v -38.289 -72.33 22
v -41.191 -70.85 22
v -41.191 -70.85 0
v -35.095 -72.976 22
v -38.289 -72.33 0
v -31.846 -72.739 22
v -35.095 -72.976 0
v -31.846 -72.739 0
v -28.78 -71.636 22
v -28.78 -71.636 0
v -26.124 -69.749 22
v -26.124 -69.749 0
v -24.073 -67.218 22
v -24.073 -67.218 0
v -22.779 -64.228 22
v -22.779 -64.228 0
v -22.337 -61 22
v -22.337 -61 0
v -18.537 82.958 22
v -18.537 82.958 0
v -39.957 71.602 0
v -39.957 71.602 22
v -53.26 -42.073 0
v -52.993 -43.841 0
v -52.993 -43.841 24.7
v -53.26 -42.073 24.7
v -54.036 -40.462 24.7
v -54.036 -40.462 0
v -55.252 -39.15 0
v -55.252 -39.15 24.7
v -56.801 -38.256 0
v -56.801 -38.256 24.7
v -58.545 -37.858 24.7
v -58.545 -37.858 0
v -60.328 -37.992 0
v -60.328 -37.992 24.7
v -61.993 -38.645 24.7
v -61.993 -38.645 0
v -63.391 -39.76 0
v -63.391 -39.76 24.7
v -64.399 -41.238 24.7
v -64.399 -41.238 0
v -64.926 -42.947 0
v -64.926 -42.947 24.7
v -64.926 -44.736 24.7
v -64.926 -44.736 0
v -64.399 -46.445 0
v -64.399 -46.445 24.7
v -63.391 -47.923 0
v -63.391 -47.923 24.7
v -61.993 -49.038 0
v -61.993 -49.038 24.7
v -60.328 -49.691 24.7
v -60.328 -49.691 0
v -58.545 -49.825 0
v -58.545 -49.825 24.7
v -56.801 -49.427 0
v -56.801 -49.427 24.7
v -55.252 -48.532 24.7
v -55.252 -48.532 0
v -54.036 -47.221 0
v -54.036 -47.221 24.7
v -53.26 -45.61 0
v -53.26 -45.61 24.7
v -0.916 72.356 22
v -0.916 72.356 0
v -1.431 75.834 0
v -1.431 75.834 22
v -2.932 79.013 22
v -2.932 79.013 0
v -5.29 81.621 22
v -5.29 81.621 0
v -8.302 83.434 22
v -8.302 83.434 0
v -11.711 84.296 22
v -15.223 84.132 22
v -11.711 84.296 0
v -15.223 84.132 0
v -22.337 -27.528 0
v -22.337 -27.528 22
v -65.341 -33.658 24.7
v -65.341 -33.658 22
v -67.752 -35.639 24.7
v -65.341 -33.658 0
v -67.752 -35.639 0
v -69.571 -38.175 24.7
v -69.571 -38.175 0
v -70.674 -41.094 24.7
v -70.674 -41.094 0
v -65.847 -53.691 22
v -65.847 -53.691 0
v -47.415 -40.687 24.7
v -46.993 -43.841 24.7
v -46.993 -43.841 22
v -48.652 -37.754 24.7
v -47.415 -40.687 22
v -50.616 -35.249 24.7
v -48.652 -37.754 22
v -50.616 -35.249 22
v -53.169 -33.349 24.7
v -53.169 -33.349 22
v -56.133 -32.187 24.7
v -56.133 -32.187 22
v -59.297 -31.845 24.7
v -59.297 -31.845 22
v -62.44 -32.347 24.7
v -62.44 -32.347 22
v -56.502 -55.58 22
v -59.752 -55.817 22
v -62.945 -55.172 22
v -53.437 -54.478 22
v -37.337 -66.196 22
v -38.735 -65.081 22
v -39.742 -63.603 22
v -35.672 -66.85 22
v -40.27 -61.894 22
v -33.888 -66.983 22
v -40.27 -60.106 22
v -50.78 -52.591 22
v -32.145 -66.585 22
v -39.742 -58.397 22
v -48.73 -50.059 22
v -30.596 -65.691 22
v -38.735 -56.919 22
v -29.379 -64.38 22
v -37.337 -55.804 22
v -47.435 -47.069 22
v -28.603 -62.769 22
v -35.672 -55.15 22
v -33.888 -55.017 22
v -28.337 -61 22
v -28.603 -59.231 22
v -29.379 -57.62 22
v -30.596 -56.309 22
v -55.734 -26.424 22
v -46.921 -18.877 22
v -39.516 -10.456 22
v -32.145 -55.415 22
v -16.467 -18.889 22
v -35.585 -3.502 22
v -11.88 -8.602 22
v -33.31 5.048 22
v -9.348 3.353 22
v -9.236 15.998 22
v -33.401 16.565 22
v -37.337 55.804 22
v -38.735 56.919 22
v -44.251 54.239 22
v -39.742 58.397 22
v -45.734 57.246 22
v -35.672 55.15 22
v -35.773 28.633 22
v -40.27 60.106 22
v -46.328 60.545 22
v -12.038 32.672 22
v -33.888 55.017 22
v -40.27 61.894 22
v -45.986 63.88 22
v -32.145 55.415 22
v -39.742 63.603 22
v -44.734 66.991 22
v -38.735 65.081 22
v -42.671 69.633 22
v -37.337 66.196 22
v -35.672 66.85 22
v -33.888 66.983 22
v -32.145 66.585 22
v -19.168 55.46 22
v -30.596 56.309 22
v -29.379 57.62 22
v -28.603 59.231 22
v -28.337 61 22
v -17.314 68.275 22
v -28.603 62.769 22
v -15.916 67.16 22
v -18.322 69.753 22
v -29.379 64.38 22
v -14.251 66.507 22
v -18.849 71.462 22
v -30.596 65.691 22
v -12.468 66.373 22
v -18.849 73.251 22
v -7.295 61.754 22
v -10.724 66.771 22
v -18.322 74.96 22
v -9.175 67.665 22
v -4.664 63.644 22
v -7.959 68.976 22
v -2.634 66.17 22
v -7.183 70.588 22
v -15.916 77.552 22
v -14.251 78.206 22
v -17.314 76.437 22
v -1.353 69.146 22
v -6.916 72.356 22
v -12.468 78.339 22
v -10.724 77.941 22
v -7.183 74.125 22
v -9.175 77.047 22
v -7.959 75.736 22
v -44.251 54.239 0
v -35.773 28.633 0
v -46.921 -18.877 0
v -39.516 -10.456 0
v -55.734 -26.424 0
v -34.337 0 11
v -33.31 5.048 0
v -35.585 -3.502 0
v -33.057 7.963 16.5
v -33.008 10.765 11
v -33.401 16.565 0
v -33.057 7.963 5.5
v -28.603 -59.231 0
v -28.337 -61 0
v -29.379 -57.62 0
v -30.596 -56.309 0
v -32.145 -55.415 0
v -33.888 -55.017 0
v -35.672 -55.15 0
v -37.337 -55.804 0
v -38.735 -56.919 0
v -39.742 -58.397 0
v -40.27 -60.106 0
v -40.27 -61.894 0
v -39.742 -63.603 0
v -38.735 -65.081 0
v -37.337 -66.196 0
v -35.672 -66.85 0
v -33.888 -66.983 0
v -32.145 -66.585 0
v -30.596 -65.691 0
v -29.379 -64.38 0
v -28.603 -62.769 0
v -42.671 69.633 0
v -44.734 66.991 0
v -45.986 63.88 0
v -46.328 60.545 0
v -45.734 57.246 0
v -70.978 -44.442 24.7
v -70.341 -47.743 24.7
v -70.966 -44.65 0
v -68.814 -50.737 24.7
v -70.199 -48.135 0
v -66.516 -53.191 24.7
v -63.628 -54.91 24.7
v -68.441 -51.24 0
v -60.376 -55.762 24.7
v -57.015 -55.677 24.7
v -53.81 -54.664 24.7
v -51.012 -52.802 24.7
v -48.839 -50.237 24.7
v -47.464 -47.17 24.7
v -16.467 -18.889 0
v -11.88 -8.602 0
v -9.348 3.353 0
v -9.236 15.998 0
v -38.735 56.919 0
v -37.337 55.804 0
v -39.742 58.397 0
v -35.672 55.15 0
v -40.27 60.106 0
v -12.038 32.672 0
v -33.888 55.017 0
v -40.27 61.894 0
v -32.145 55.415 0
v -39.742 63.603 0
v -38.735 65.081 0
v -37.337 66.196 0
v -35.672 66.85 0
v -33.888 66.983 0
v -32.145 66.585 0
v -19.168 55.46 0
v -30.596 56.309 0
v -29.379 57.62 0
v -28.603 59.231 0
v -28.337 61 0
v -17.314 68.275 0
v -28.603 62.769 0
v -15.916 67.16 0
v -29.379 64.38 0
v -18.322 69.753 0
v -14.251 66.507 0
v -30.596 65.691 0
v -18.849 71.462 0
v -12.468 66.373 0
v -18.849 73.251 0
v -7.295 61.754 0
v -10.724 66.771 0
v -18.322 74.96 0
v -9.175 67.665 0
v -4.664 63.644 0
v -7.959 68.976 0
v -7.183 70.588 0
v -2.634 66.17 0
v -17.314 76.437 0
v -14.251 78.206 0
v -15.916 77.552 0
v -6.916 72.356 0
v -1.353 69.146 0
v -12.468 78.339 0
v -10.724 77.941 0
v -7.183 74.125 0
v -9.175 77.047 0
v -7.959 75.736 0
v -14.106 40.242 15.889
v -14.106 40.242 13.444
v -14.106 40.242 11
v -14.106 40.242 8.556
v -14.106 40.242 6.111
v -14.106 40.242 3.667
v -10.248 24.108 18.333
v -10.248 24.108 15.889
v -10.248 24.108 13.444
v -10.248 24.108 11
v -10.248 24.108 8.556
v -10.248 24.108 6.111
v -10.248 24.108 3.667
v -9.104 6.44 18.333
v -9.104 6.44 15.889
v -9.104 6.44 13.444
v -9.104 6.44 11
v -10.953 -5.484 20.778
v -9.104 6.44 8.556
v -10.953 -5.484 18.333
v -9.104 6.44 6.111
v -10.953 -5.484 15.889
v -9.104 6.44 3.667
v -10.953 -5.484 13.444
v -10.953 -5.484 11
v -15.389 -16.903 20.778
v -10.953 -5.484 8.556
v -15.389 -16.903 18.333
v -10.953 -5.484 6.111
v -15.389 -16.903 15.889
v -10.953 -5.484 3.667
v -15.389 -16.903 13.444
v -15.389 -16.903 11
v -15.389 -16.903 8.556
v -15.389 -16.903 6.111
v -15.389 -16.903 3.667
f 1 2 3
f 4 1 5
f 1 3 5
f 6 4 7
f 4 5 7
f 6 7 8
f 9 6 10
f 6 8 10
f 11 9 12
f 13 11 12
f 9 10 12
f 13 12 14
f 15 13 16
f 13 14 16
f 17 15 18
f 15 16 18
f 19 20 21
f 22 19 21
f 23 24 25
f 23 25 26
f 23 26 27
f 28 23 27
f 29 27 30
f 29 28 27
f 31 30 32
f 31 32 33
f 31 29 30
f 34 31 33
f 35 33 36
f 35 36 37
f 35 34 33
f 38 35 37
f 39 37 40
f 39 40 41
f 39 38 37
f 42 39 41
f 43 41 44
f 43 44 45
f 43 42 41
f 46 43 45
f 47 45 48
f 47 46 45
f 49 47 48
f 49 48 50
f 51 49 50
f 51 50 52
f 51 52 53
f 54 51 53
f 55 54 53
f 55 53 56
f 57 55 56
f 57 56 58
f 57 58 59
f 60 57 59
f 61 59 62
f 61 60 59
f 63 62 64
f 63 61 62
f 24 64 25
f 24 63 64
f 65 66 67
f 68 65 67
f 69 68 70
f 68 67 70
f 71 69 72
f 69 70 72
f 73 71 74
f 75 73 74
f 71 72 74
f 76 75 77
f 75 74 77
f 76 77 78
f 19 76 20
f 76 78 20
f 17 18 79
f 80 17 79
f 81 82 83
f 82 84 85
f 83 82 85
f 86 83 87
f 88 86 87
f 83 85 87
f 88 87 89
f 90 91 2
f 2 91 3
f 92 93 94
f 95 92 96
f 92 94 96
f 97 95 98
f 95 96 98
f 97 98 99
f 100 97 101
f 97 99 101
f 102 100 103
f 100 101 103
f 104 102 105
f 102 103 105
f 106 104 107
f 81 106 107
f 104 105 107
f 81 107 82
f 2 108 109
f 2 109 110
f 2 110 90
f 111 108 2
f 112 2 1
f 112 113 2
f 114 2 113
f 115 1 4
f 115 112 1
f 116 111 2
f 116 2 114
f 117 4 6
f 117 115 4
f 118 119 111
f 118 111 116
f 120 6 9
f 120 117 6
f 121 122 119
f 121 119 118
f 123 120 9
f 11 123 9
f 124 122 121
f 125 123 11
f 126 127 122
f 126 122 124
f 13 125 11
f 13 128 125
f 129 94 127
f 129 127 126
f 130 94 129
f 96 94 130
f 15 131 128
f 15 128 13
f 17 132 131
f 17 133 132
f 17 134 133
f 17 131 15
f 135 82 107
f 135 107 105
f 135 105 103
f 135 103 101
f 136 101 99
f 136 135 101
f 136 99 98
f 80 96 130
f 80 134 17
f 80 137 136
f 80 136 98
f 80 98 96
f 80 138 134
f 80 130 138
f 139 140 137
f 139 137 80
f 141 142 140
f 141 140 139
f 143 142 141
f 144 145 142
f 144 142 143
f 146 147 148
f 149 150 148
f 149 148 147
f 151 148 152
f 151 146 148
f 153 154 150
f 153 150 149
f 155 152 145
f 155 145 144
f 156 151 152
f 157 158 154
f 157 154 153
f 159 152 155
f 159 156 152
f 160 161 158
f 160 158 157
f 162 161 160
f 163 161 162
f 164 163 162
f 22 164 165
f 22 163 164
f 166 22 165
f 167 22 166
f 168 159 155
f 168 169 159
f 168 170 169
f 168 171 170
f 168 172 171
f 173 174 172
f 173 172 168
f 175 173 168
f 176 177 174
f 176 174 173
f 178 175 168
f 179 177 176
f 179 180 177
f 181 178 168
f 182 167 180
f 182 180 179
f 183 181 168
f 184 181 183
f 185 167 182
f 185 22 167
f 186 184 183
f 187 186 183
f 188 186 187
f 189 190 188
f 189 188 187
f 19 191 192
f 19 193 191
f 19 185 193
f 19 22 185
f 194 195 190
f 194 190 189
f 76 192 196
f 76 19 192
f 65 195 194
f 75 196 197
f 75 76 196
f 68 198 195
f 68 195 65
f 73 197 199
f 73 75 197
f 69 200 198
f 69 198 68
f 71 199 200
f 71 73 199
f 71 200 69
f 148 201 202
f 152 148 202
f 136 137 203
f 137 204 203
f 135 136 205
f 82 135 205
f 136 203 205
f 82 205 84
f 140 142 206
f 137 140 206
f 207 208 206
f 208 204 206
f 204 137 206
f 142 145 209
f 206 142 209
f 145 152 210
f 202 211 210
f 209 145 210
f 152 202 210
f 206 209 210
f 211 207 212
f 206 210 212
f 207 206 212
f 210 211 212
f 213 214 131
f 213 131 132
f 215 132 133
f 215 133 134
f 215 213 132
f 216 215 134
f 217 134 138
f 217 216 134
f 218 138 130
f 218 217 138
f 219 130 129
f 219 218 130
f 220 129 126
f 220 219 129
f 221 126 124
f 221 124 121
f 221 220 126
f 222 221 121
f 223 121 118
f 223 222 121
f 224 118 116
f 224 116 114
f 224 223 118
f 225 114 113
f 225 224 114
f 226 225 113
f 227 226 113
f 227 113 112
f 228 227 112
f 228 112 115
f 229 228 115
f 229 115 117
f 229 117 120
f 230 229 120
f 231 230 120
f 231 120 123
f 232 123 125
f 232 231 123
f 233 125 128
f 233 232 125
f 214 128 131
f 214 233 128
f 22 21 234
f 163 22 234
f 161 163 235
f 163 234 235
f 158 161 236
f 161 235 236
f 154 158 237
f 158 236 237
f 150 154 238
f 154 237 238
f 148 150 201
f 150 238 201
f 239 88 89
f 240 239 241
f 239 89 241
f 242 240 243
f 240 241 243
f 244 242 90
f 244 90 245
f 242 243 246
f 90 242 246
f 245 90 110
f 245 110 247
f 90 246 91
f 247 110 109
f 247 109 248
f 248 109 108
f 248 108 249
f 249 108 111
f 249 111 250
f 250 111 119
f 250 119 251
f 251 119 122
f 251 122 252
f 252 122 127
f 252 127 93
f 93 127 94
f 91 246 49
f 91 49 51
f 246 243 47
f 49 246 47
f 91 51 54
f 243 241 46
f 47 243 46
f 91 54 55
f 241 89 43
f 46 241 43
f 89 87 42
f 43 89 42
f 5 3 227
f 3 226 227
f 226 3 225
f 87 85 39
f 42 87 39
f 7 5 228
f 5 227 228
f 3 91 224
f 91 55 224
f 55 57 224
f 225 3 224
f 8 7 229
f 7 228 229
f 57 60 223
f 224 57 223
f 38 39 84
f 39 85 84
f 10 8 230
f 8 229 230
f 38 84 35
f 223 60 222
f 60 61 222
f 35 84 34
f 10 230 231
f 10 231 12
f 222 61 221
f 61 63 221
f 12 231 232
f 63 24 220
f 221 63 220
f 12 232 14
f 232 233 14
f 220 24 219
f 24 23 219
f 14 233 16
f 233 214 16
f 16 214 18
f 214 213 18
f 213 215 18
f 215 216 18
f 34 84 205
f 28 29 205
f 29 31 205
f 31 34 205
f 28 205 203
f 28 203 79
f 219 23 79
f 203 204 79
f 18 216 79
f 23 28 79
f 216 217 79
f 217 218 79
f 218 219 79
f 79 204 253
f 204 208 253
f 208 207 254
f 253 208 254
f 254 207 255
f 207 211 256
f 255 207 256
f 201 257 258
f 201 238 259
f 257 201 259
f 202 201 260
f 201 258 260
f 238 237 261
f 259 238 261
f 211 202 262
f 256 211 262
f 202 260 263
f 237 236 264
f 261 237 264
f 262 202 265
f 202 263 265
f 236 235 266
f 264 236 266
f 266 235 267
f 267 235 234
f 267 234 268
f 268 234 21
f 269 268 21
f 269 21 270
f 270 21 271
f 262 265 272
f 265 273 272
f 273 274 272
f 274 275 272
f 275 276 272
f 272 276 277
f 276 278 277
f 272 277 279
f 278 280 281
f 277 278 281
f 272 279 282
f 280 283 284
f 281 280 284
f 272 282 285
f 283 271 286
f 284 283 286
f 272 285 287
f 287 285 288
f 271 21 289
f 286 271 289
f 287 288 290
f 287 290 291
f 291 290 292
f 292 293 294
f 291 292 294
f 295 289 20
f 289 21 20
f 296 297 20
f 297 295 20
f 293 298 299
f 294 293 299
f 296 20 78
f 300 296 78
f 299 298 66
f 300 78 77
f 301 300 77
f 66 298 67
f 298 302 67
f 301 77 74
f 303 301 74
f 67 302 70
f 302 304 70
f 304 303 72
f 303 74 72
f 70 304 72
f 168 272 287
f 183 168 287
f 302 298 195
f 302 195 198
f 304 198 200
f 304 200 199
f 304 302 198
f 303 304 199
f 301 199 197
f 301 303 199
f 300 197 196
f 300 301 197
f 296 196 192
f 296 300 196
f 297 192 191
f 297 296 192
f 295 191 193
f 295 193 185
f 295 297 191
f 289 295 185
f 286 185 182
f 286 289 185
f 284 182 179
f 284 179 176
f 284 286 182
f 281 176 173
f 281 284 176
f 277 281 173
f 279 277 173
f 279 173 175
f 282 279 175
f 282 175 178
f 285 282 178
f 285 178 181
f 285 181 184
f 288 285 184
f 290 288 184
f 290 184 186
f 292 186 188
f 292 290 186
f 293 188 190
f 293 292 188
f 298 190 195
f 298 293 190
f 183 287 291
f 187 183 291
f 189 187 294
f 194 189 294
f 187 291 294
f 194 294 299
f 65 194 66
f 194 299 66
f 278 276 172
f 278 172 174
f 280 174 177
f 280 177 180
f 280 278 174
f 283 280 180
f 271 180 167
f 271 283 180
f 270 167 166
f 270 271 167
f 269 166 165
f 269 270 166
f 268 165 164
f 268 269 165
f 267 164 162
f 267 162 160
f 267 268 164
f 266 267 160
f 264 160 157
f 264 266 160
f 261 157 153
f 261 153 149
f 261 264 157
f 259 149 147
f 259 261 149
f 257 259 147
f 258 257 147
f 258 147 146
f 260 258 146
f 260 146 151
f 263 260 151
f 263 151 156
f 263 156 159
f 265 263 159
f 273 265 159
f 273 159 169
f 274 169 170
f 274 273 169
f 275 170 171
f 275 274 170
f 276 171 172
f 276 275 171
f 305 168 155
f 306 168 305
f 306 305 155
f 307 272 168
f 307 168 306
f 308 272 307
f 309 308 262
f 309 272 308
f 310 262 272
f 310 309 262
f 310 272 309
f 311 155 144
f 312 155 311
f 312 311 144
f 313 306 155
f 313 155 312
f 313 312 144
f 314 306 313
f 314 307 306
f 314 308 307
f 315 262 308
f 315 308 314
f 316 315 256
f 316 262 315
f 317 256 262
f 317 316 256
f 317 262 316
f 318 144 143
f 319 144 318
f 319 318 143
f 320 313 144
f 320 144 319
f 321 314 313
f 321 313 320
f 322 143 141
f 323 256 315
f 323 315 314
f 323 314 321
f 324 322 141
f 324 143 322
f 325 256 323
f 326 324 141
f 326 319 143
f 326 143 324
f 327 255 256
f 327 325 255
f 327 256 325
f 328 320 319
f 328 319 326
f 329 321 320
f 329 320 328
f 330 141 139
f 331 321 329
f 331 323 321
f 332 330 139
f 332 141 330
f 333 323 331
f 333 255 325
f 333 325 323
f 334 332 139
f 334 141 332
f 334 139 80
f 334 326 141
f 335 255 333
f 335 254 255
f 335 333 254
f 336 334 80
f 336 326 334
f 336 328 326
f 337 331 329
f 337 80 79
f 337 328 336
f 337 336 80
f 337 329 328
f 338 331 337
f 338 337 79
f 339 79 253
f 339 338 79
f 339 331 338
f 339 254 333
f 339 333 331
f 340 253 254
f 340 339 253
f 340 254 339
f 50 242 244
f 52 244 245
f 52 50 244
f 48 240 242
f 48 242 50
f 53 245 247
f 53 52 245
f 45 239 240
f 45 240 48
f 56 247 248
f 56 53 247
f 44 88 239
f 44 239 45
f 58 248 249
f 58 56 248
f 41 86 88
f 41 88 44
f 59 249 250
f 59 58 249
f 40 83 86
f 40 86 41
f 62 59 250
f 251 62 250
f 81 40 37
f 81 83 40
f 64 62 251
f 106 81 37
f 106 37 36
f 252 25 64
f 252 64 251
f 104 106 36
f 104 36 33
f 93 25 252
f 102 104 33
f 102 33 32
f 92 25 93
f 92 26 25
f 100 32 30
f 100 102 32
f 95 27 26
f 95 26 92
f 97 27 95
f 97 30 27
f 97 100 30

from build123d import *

# Parameters (mm, degrees)
F0_R     = 6
F1_DEPTH = 22
F2_DEPTH = 24.7


# Not quite as in the source:
# - the dataset's text gives a spline's control points without its knots; the knots are read off the source's solid
# - a feature names something its author has since deleted; it is built from what else it names


with BuildPart() as f1:
    # F0 (on Top) → F1 (new body)
    with BuildSketch(Plane.XY):
        with BuildLine():
            ThreePointArc((-44.2506901264, 54.2390673163), (-37.2170072256, 49.3508335883), (-28.7157507853, 50.3978116504))
            ThreePointArc((-28.7157507853, 50.3978116504), (-24.0543074262, 54.8133136372), (-22.3365694268, 61))
            ThreePointArc((-22.3365694268, 61), (-28.149883064, 71.2822620006), (-39.9573880683, 71.6021883496))
            ThreePointArc((-39.9573880683, 71.6021883496), (-45.9857358385, 63.8804377989), (-44.2506901264, 54.2390673163))
        make_face()
        with Locations((-34.3365694268, 61)):
            Circle(F0_R, mode=Mode.SUBTRACT)
        with BuildLine():
            ThreePointArc((-41.1910181988, -70.8496970528), (-28.7801940464, -71.6361032635), (-22.3365694268, -61))
            ThreePointArc((-22.3365694268, -61), (-39.8929448072, -50.3638967365), (-41.1910181988, -70.8496970528))
        make_face()
        with Locations((-34.3365694268, -61)):
            Circle(F0_R, mode=Mode.SUBTRACT)
        with BuildLine():
            ThreePointArc((-18.536827307, 82.9584370096), (-23.5181968435, 66.7354296949), (-7.2951893768, 61.7540606536))
            ThreePointArc((-7.2951893768, 61.7540606536), (-2.6337464761, 66.1695626111), (-0.9160086655, 72.35624866))
            ThreePointArc((-0.9160086655, 72.35624866), (-6.7293223028, 82.6385106606), (-18.536827307, 82.9584370096))
        make_face()
        with Locations((-12.9160086655, 72.35624866)):
            Circle(F0_R, mode=Mode.SUBTRACT)
        with BuildLine():
            Line((-22.3365694268, 51.1162809556), (-22.3365694268, -27.5282078784))
            add(Edge.make_bspline(
                [(-19.1679852382, 55.4596212318), (-19.1490913177, 55.4067702681), (-18.2627780559, 52.9264771043), (-16.5142433132, 47.9330355336), (-14.0597955985, 40.2848666723), (-11.8817933237, 32.380636116), (-10.1403594344, 24.1713941631), (-9.0428174028, 15.5795000988), (-8.9070069048, 8.0286707772), (-9.4009784523, 2.5365834769), (-9.8823537024, -0.64961691), (-10.3506440426, -3.0593767725), (-10.9326328555, -5.4817632435), (-11.6386397696, -7.9166705081), (-12.4443293031, -10.2769526895), (-13.6414482379, -13.3297795407), (-15.3453349713, -16.9551929086), (-17.6521060756, -20.9929507786), (-20.005676914, -24.5007883382), (-21.6047261121, -26.6086284401), (-22.3365694268, -27.5282078784)],
                knots=[0.0611387127, 0.0611387127, 0.0611387127, 0.0611387127, 0.0625, 0.125, 0.1875, 0.25, 0.3125, 0.375, 0.4375, 0.46875, 0.484375, 0.5, 0.515625, 0.53125, 0.546875, 0.5625, 0.59375, 0.625, 0.65625, 0.6818147445, 0.6818147445, 0.6818147445, 0.6818147445], degree=3))
            Line((-19.1679852382, 55.4596212318), (-21.0545147962, 54.4594654001))
            ThreePointArc((-21.0545147962, 54.4594654001), (-22.0050663394, 52.9065704787), (-22.3365694268, 51.1162809556))
        make_face()
        with BuildLine():
            ThreePointArc((-41.1910181988, -70.8496970528), (-39.8929448072, -50.3638967365), (-22.3365694268, -61))
            Line((-22.3365694268, -61), (-22.3365694268, -27.5282078784))
            Line((-22.3365694268, -27.5282078784), (-22.3365694268, 51.1162809556))
            ThreePointArc((-22.3365694268, 51.1162809556), (-22.0050663394, 52.9065704787), (-21.0545147962, 54.4594654001))
            Line((-21.0545147962, 54.4594654001), (-28.7157507853, 50.3978116504))
            ThreePointArc((-28.7157507853, 50.3978116504), (-37.2170072256, 49.3508335883), (-44.2506901264, 54.2390673163))
            add(Edge.make_bspline(
                [(-44.2506901264, 54.2390673163), (-37.1132332482, 34.6511342855), (-23.4734527351, -2.7816813244), (-51.824990918, -23.6902906337), (-65.3406685812, -33.657792996)],
                knots=[0, 0, 0, 0, 0.523282385, 1, 1, 1, 1], degree=3))
            ThreePointArc((-65.3406685812, -33.657792996), (-53.1694343986, -33.3492849771), (-46.993012785, -43.8414694388))
            ThreePointArc((-46.993012785, -43.8414694388), (-53.4366374046, -54.4775727023), (-65.847461557, -53.6911664916))
            Line((-65.847461557, -53.6911664916), (-41.1910181988, -70.8496970528))
        make_face()
        with BuildLine():
            Line((-21.0545147962, 54.4594654001), (-19.1679852382, 55.4596212318))
            Line((-19.1679852382, 55.4596212318), (-7.2951893768, 61.7540606536))
            ThreePointArc((-7.2951893768, 61.7540606536), (-23.5181968435, 66.7354296949), (-18.536827307, 82.9584370096))
            Line((-18.536827307, 82.9584370096), (-39.9573880683, 71.6021883496))
            ThreePointArc((-39.9573880683, 71.6021883496), (-28.149883064, 71.2822620006), (-22.3365694268, 61))
            ThreePointArc((-22.3365694268, 61), (-24.0543074262, 54.8133136372), (-28.7157507853, 50.3978116504))
            Line((-28.7157507853, 50.3978116504), (-21.0545147962, 54.4594654001))
        make_face()
    extrude(amount=F1_DEPTH)

    # F0 (on Top) → F2 (join)
    with BuildSketch(Plane.XY):
        with BuildLine():
            ThreePointArc((-70.6743202458, -41.0942788729), (-70.1985453114, -48.1351905289), (-65.847461557, -53.6911664916))
            ThreePointArc((-65.847461557, -53.6911664916), (-53.4366374046, -54.4775727023), (-46.993012785, -43.8414694388))
            ThreePointArc((-46.993012785, -43.8414694388), (-53.1694343986, -33.3492849771), (-65.3406685812, -33.657792996))
            ThreePointArc((-65.3406685812, -33.657792996), (-68.7442285851, -36.8476299769), (-70.6743202458, -41.0942788729))
        make_face()
        with Locations((-58.993012785, -43.8414694388)):
            Circle(F0_R, mode=Mode.SUBTRACT)
    extrude(amount=F2_DEPTH)


solid = f1.part
